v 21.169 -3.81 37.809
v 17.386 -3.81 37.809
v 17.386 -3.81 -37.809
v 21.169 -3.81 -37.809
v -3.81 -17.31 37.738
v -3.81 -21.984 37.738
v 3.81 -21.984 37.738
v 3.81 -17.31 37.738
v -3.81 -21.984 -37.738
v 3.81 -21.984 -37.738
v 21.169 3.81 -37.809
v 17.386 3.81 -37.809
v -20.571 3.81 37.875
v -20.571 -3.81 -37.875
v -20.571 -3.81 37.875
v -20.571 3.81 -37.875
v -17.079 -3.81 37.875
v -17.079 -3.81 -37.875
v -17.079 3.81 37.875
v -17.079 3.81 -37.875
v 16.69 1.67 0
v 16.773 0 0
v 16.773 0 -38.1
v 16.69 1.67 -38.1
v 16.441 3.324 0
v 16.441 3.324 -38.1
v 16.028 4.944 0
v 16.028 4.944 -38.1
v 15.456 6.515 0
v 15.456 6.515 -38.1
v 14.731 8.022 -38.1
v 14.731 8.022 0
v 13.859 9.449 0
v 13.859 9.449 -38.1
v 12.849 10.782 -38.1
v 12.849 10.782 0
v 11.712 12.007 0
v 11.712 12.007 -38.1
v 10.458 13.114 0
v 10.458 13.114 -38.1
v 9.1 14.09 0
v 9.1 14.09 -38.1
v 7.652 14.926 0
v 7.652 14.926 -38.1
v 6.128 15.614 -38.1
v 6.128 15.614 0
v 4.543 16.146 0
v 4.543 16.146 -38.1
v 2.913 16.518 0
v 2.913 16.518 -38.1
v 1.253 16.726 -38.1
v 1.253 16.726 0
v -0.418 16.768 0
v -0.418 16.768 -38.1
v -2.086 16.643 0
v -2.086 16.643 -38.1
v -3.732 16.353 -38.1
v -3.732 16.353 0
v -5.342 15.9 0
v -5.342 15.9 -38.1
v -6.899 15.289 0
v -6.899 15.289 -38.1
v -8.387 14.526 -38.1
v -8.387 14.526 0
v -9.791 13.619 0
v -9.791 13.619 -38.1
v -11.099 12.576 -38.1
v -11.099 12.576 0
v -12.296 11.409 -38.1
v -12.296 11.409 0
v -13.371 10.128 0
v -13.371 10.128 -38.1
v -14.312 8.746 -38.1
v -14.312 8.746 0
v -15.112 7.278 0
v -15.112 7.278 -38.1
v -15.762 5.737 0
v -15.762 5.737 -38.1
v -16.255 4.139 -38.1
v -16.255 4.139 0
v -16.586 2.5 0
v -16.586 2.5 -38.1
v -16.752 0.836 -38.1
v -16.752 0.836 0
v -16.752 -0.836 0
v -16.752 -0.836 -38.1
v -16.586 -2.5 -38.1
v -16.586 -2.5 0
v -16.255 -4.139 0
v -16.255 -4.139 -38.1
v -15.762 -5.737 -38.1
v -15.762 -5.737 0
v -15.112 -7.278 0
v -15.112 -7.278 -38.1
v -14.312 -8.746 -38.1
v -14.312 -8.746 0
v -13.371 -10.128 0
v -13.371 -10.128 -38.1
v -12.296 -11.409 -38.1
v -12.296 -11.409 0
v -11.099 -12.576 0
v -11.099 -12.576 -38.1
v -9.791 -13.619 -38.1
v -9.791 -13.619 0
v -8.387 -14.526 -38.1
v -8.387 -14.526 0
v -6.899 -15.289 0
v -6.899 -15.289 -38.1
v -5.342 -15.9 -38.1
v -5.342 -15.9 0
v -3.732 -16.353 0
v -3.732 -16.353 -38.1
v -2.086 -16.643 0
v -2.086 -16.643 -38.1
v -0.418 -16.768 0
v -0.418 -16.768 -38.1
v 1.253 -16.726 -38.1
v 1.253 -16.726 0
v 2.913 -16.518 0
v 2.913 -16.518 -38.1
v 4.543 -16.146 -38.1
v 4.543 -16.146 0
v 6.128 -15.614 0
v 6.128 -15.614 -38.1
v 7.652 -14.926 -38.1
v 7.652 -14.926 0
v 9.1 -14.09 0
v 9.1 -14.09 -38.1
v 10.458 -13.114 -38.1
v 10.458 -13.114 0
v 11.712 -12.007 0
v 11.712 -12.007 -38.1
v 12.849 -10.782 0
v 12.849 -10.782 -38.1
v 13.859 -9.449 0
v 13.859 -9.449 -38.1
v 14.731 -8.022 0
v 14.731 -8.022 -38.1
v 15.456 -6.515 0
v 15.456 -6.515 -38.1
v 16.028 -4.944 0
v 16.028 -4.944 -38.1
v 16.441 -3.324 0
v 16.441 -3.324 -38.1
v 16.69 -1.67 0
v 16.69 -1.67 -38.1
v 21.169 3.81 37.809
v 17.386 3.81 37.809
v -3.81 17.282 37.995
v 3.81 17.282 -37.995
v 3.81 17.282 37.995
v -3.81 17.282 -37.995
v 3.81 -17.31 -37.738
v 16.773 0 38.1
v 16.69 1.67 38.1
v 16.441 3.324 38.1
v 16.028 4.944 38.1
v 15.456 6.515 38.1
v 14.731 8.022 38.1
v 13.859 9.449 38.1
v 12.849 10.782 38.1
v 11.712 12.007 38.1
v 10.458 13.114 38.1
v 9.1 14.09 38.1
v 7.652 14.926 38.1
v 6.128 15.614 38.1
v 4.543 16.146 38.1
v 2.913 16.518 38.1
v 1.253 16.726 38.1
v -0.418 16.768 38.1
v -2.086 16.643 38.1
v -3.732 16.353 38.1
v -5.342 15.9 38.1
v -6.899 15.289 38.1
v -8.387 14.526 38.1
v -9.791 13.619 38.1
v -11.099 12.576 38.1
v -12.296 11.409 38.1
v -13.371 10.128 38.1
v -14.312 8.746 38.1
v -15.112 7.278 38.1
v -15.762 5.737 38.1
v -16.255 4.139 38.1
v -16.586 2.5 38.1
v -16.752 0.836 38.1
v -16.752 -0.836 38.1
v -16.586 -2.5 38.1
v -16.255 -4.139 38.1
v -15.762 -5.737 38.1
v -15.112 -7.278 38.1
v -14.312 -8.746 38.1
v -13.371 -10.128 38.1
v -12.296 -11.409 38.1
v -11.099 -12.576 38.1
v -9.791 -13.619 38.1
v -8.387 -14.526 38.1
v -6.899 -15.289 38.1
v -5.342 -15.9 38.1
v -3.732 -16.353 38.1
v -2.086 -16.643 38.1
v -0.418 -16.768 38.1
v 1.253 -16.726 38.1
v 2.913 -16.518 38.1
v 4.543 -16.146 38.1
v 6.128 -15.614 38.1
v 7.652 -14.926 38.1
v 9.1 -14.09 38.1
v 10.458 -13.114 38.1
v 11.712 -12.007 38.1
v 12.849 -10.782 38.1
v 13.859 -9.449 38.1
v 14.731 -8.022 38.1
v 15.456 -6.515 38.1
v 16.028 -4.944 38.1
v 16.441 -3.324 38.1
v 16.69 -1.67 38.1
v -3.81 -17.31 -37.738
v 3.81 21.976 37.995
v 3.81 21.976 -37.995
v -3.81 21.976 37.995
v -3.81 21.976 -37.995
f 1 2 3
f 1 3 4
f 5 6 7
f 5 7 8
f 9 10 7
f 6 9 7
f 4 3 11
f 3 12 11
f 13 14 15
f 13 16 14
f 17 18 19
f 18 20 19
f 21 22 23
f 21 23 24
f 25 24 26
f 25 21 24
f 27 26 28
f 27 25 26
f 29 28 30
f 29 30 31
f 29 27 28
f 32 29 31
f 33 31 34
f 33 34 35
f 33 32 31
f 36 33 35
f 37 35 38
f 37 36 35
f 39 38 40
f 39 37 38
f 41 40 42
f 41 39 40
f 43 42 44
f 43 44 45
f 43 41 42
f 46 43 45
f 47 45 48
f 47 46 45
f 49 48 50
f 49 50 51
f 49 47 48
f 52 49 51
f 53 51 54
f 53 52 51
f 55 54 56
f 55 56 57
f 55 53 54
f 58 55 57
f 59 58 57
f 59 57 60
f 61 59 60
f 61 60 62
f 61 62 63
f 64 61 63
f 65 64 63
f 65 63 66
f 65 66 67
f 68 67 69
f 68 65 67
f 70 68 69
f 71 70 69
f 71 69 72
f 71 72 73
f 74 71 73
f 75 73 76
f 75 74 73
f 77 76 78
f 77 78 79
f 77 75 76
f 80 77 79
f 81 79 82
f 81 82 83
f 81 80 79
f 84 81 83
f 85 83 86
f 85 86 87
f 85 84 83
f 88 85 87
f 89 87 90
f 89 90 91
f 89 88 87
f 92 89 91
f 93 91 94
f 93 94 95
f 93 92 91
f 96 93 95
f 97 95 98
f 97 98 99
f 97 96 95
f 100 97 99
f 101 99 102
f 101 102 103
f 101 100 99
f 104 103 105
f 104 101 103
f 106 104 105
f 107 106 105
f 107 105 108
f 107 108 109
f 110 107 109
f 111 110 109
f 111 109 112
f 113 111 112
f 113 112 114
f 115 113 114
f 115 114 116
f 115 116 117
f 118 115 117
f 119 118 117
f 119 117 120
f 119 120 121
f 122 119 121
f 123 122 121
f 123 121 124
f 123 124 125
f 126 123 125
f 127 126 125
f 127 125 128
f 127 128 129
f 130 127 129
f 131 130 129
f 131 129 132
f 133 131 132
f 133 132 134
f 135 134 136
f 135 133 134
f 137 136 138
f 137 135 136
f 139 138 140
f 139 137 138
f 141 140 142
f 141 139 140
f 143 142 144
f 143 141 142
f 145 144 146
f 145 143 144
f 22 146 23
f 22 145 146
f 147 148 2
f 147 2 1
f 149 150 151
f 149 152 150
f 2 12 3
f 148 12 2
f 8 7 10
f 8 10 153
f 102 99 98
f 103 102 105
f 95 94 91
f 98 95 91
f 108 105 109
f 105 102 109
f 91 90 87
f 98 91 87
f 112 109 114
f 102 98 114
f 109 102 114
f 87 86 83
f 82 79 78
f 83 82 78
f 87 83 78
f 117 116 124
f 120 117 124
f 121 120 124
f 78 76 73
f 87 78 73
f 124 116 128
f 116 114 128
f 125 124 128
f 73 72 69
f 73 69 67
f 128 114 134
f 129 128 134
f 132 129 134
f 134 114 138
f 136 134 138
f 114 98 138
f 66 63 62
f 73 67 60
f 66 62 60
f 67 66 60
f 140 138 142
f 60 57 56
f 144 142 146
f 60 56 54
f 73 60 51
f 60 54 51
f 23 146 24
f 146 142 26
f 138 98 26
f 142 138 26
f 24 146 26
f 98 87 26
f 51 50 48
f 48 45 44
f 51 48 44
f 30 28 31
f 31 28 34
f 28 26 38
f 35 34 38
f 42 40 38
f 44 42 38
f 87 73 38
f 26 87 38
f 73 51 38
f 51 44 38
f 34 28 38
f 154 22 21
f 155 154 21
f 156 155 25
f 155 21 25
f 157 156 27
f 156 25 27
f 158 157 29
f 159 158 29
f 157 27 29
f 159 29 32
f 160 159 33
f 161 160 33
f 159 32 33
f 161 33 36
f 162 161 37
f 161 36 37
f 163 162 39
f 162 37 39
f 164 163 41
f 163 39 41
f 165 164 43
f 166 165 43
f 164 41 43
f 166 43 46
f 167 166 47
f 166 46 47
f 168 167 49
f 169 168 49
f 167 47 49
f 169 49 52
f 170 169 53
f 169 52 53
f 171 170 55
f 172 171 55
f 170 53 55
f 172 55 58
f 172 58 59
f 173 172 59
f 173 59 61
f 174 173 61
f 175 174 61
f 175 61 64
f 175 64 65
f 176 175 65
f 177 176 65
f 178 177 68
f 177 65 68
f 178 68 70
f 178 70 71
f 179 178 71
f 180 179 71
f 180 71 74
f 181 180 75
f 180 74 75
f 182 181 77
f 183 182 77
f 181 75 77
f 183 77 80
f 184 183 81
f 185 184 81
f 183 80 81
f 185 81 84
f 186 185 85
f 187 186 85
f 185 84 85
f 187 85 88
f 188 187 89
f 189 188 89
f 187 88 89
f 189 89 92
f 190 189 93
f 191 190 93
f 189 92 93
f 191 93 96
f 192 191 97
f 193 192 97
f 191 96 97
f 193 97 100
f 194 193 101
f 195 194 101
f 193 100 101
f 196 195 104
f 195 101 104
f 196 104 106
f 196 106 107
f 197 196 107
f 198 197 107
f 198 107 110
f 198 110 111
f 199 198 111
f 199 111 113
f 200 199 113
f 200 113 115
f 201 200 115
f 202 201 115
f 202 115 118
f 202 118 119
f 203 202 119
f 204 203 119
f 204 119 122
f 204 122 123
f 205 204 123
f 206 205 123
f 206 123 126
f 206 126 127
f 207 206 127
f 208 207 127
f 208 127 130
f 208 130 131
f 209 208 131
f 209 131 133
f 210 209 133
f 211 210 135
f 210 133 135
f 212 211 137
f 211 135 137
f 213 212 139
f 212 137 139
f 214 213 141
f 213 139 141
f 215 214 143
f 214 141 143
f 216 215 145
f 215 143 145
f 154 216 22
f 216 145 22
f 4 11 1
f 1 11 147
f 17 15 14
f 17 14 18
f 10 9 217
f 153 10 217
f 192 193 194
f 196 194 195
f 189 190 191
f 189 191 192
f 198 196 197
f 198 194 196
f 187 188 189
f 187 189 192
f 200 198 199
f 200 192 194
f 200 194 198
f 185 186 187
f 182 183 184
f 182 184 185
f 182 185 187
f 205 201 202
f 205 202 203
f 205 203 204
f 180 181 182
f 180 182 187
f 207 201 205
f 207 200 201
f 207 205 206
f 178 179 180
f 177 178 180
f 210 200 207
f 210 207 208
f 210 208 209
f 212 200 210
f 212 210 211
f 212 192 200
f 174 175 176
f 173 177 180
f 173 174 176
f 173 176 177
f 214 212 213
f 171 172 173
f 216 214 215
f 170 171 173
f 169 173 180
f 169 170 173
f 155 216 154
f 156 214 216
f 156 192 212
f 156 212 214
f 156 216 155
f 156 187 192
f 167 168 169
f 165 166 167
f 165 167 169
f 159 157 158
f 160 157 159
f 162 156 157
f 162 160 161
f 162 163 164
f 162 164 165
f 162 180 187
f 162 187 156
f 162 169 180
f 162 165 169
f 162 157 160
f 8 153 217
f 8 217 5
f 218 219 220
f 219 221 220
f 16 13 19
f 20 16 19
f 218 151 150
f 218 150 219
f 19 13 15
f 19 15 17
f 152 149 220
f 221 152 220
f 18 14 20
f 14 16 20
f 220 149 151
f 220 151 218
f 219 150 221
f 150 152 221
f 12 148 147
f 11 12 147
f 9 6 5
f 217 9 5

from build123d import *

# Parameters (mm, degrees)
F0_R          = 16.7732892251
F1_DEPTH      = 38.1
F1_DEPTH_BACK = 38.1
F2_W          = 4.6742036939
F2_H          = 75.4768997431
F3_DEPTH      = 3.81
F3_DEPTH_BACK = 3.81
F4_W          = 4.6942159534
F4_H          = 75.990319252
F5_DEPTH      = 3.81
F5_DEPTH_BACK = 3.81
F6_W          = 3.7830360234
F6_H          = 75.6176039577
F7_DEPTH      = 3.81
F7_DEPTH_BACK = 3.81
F8_W          = 3.4921914339
F8_H          = 75.7498890162
F9_DEPTH      = 3.81
F9_DEPTH_BACK = 3.81


with BuildPart() as f1:
    # F0 (on Top) → F1 (new body, two sides)
    with BuildSketch(Plane.XY) as f1_sk:
        Circle(F0_R)
    extrude(amount=-F1_DEPTH)
    extrude(f1_sk.sketch, amount=F1_DEPTH_BACK)


with BuildPart() as f3:
    # F2 (on Right) → F3 (new body, two sides)
    with BuildSketch(Plane.YZ) as f3_sk:
        with Locations((-19.6471717209, 0)):
            Rectangle(F2_W, F2_H)
    extrude(amount=F3_DEPTH)
    extrude(f3_sk.sketch, amount=-F3_DEPTH_BACK)


with BuildPart() as f5:
    # F4 (on Right) → F5 (new body, two sides)
    with BuildSketch(Plane.YZ) as f5_sk:
        with Locations((19.6291580796, 0)):
            Rectangle(F4_W, F4_H)
    extrude(amount=-F5_DEPTH)
    extrude(f5_sk.sketch, amount=F5_DEPTH_BACK)


with BuildPart() as f7:
    # F6 (on Front) → F7 (new body, two sides)
    with BuildSketch(Plane.XZ) as f7_sk:
        with Locations((19.277555868, 0)):
            Rectangle(F6_W, F6_H)
    extrude(amount=-F7_DEPTH)
    extrude(f7_sk.sketch, amount=F7_DEPTH_BACK)


with BuildPart() as f9:
    # F8 (on Front) → F9 (new body, two sides)
    with BuildSketch(Plane.XZ) as f9_sk:
        with Locations((-18.8250113279, 0)):
            Rectangle(F8_W, F8_H)
    extrude(amount=-F9_DEPTH)
    extrude(f9_sk.sketch, amount=F9_DEPTH_BACK)


solid = Compound([f1.part, f3.part, f5.part, f7.part, f9.part])
